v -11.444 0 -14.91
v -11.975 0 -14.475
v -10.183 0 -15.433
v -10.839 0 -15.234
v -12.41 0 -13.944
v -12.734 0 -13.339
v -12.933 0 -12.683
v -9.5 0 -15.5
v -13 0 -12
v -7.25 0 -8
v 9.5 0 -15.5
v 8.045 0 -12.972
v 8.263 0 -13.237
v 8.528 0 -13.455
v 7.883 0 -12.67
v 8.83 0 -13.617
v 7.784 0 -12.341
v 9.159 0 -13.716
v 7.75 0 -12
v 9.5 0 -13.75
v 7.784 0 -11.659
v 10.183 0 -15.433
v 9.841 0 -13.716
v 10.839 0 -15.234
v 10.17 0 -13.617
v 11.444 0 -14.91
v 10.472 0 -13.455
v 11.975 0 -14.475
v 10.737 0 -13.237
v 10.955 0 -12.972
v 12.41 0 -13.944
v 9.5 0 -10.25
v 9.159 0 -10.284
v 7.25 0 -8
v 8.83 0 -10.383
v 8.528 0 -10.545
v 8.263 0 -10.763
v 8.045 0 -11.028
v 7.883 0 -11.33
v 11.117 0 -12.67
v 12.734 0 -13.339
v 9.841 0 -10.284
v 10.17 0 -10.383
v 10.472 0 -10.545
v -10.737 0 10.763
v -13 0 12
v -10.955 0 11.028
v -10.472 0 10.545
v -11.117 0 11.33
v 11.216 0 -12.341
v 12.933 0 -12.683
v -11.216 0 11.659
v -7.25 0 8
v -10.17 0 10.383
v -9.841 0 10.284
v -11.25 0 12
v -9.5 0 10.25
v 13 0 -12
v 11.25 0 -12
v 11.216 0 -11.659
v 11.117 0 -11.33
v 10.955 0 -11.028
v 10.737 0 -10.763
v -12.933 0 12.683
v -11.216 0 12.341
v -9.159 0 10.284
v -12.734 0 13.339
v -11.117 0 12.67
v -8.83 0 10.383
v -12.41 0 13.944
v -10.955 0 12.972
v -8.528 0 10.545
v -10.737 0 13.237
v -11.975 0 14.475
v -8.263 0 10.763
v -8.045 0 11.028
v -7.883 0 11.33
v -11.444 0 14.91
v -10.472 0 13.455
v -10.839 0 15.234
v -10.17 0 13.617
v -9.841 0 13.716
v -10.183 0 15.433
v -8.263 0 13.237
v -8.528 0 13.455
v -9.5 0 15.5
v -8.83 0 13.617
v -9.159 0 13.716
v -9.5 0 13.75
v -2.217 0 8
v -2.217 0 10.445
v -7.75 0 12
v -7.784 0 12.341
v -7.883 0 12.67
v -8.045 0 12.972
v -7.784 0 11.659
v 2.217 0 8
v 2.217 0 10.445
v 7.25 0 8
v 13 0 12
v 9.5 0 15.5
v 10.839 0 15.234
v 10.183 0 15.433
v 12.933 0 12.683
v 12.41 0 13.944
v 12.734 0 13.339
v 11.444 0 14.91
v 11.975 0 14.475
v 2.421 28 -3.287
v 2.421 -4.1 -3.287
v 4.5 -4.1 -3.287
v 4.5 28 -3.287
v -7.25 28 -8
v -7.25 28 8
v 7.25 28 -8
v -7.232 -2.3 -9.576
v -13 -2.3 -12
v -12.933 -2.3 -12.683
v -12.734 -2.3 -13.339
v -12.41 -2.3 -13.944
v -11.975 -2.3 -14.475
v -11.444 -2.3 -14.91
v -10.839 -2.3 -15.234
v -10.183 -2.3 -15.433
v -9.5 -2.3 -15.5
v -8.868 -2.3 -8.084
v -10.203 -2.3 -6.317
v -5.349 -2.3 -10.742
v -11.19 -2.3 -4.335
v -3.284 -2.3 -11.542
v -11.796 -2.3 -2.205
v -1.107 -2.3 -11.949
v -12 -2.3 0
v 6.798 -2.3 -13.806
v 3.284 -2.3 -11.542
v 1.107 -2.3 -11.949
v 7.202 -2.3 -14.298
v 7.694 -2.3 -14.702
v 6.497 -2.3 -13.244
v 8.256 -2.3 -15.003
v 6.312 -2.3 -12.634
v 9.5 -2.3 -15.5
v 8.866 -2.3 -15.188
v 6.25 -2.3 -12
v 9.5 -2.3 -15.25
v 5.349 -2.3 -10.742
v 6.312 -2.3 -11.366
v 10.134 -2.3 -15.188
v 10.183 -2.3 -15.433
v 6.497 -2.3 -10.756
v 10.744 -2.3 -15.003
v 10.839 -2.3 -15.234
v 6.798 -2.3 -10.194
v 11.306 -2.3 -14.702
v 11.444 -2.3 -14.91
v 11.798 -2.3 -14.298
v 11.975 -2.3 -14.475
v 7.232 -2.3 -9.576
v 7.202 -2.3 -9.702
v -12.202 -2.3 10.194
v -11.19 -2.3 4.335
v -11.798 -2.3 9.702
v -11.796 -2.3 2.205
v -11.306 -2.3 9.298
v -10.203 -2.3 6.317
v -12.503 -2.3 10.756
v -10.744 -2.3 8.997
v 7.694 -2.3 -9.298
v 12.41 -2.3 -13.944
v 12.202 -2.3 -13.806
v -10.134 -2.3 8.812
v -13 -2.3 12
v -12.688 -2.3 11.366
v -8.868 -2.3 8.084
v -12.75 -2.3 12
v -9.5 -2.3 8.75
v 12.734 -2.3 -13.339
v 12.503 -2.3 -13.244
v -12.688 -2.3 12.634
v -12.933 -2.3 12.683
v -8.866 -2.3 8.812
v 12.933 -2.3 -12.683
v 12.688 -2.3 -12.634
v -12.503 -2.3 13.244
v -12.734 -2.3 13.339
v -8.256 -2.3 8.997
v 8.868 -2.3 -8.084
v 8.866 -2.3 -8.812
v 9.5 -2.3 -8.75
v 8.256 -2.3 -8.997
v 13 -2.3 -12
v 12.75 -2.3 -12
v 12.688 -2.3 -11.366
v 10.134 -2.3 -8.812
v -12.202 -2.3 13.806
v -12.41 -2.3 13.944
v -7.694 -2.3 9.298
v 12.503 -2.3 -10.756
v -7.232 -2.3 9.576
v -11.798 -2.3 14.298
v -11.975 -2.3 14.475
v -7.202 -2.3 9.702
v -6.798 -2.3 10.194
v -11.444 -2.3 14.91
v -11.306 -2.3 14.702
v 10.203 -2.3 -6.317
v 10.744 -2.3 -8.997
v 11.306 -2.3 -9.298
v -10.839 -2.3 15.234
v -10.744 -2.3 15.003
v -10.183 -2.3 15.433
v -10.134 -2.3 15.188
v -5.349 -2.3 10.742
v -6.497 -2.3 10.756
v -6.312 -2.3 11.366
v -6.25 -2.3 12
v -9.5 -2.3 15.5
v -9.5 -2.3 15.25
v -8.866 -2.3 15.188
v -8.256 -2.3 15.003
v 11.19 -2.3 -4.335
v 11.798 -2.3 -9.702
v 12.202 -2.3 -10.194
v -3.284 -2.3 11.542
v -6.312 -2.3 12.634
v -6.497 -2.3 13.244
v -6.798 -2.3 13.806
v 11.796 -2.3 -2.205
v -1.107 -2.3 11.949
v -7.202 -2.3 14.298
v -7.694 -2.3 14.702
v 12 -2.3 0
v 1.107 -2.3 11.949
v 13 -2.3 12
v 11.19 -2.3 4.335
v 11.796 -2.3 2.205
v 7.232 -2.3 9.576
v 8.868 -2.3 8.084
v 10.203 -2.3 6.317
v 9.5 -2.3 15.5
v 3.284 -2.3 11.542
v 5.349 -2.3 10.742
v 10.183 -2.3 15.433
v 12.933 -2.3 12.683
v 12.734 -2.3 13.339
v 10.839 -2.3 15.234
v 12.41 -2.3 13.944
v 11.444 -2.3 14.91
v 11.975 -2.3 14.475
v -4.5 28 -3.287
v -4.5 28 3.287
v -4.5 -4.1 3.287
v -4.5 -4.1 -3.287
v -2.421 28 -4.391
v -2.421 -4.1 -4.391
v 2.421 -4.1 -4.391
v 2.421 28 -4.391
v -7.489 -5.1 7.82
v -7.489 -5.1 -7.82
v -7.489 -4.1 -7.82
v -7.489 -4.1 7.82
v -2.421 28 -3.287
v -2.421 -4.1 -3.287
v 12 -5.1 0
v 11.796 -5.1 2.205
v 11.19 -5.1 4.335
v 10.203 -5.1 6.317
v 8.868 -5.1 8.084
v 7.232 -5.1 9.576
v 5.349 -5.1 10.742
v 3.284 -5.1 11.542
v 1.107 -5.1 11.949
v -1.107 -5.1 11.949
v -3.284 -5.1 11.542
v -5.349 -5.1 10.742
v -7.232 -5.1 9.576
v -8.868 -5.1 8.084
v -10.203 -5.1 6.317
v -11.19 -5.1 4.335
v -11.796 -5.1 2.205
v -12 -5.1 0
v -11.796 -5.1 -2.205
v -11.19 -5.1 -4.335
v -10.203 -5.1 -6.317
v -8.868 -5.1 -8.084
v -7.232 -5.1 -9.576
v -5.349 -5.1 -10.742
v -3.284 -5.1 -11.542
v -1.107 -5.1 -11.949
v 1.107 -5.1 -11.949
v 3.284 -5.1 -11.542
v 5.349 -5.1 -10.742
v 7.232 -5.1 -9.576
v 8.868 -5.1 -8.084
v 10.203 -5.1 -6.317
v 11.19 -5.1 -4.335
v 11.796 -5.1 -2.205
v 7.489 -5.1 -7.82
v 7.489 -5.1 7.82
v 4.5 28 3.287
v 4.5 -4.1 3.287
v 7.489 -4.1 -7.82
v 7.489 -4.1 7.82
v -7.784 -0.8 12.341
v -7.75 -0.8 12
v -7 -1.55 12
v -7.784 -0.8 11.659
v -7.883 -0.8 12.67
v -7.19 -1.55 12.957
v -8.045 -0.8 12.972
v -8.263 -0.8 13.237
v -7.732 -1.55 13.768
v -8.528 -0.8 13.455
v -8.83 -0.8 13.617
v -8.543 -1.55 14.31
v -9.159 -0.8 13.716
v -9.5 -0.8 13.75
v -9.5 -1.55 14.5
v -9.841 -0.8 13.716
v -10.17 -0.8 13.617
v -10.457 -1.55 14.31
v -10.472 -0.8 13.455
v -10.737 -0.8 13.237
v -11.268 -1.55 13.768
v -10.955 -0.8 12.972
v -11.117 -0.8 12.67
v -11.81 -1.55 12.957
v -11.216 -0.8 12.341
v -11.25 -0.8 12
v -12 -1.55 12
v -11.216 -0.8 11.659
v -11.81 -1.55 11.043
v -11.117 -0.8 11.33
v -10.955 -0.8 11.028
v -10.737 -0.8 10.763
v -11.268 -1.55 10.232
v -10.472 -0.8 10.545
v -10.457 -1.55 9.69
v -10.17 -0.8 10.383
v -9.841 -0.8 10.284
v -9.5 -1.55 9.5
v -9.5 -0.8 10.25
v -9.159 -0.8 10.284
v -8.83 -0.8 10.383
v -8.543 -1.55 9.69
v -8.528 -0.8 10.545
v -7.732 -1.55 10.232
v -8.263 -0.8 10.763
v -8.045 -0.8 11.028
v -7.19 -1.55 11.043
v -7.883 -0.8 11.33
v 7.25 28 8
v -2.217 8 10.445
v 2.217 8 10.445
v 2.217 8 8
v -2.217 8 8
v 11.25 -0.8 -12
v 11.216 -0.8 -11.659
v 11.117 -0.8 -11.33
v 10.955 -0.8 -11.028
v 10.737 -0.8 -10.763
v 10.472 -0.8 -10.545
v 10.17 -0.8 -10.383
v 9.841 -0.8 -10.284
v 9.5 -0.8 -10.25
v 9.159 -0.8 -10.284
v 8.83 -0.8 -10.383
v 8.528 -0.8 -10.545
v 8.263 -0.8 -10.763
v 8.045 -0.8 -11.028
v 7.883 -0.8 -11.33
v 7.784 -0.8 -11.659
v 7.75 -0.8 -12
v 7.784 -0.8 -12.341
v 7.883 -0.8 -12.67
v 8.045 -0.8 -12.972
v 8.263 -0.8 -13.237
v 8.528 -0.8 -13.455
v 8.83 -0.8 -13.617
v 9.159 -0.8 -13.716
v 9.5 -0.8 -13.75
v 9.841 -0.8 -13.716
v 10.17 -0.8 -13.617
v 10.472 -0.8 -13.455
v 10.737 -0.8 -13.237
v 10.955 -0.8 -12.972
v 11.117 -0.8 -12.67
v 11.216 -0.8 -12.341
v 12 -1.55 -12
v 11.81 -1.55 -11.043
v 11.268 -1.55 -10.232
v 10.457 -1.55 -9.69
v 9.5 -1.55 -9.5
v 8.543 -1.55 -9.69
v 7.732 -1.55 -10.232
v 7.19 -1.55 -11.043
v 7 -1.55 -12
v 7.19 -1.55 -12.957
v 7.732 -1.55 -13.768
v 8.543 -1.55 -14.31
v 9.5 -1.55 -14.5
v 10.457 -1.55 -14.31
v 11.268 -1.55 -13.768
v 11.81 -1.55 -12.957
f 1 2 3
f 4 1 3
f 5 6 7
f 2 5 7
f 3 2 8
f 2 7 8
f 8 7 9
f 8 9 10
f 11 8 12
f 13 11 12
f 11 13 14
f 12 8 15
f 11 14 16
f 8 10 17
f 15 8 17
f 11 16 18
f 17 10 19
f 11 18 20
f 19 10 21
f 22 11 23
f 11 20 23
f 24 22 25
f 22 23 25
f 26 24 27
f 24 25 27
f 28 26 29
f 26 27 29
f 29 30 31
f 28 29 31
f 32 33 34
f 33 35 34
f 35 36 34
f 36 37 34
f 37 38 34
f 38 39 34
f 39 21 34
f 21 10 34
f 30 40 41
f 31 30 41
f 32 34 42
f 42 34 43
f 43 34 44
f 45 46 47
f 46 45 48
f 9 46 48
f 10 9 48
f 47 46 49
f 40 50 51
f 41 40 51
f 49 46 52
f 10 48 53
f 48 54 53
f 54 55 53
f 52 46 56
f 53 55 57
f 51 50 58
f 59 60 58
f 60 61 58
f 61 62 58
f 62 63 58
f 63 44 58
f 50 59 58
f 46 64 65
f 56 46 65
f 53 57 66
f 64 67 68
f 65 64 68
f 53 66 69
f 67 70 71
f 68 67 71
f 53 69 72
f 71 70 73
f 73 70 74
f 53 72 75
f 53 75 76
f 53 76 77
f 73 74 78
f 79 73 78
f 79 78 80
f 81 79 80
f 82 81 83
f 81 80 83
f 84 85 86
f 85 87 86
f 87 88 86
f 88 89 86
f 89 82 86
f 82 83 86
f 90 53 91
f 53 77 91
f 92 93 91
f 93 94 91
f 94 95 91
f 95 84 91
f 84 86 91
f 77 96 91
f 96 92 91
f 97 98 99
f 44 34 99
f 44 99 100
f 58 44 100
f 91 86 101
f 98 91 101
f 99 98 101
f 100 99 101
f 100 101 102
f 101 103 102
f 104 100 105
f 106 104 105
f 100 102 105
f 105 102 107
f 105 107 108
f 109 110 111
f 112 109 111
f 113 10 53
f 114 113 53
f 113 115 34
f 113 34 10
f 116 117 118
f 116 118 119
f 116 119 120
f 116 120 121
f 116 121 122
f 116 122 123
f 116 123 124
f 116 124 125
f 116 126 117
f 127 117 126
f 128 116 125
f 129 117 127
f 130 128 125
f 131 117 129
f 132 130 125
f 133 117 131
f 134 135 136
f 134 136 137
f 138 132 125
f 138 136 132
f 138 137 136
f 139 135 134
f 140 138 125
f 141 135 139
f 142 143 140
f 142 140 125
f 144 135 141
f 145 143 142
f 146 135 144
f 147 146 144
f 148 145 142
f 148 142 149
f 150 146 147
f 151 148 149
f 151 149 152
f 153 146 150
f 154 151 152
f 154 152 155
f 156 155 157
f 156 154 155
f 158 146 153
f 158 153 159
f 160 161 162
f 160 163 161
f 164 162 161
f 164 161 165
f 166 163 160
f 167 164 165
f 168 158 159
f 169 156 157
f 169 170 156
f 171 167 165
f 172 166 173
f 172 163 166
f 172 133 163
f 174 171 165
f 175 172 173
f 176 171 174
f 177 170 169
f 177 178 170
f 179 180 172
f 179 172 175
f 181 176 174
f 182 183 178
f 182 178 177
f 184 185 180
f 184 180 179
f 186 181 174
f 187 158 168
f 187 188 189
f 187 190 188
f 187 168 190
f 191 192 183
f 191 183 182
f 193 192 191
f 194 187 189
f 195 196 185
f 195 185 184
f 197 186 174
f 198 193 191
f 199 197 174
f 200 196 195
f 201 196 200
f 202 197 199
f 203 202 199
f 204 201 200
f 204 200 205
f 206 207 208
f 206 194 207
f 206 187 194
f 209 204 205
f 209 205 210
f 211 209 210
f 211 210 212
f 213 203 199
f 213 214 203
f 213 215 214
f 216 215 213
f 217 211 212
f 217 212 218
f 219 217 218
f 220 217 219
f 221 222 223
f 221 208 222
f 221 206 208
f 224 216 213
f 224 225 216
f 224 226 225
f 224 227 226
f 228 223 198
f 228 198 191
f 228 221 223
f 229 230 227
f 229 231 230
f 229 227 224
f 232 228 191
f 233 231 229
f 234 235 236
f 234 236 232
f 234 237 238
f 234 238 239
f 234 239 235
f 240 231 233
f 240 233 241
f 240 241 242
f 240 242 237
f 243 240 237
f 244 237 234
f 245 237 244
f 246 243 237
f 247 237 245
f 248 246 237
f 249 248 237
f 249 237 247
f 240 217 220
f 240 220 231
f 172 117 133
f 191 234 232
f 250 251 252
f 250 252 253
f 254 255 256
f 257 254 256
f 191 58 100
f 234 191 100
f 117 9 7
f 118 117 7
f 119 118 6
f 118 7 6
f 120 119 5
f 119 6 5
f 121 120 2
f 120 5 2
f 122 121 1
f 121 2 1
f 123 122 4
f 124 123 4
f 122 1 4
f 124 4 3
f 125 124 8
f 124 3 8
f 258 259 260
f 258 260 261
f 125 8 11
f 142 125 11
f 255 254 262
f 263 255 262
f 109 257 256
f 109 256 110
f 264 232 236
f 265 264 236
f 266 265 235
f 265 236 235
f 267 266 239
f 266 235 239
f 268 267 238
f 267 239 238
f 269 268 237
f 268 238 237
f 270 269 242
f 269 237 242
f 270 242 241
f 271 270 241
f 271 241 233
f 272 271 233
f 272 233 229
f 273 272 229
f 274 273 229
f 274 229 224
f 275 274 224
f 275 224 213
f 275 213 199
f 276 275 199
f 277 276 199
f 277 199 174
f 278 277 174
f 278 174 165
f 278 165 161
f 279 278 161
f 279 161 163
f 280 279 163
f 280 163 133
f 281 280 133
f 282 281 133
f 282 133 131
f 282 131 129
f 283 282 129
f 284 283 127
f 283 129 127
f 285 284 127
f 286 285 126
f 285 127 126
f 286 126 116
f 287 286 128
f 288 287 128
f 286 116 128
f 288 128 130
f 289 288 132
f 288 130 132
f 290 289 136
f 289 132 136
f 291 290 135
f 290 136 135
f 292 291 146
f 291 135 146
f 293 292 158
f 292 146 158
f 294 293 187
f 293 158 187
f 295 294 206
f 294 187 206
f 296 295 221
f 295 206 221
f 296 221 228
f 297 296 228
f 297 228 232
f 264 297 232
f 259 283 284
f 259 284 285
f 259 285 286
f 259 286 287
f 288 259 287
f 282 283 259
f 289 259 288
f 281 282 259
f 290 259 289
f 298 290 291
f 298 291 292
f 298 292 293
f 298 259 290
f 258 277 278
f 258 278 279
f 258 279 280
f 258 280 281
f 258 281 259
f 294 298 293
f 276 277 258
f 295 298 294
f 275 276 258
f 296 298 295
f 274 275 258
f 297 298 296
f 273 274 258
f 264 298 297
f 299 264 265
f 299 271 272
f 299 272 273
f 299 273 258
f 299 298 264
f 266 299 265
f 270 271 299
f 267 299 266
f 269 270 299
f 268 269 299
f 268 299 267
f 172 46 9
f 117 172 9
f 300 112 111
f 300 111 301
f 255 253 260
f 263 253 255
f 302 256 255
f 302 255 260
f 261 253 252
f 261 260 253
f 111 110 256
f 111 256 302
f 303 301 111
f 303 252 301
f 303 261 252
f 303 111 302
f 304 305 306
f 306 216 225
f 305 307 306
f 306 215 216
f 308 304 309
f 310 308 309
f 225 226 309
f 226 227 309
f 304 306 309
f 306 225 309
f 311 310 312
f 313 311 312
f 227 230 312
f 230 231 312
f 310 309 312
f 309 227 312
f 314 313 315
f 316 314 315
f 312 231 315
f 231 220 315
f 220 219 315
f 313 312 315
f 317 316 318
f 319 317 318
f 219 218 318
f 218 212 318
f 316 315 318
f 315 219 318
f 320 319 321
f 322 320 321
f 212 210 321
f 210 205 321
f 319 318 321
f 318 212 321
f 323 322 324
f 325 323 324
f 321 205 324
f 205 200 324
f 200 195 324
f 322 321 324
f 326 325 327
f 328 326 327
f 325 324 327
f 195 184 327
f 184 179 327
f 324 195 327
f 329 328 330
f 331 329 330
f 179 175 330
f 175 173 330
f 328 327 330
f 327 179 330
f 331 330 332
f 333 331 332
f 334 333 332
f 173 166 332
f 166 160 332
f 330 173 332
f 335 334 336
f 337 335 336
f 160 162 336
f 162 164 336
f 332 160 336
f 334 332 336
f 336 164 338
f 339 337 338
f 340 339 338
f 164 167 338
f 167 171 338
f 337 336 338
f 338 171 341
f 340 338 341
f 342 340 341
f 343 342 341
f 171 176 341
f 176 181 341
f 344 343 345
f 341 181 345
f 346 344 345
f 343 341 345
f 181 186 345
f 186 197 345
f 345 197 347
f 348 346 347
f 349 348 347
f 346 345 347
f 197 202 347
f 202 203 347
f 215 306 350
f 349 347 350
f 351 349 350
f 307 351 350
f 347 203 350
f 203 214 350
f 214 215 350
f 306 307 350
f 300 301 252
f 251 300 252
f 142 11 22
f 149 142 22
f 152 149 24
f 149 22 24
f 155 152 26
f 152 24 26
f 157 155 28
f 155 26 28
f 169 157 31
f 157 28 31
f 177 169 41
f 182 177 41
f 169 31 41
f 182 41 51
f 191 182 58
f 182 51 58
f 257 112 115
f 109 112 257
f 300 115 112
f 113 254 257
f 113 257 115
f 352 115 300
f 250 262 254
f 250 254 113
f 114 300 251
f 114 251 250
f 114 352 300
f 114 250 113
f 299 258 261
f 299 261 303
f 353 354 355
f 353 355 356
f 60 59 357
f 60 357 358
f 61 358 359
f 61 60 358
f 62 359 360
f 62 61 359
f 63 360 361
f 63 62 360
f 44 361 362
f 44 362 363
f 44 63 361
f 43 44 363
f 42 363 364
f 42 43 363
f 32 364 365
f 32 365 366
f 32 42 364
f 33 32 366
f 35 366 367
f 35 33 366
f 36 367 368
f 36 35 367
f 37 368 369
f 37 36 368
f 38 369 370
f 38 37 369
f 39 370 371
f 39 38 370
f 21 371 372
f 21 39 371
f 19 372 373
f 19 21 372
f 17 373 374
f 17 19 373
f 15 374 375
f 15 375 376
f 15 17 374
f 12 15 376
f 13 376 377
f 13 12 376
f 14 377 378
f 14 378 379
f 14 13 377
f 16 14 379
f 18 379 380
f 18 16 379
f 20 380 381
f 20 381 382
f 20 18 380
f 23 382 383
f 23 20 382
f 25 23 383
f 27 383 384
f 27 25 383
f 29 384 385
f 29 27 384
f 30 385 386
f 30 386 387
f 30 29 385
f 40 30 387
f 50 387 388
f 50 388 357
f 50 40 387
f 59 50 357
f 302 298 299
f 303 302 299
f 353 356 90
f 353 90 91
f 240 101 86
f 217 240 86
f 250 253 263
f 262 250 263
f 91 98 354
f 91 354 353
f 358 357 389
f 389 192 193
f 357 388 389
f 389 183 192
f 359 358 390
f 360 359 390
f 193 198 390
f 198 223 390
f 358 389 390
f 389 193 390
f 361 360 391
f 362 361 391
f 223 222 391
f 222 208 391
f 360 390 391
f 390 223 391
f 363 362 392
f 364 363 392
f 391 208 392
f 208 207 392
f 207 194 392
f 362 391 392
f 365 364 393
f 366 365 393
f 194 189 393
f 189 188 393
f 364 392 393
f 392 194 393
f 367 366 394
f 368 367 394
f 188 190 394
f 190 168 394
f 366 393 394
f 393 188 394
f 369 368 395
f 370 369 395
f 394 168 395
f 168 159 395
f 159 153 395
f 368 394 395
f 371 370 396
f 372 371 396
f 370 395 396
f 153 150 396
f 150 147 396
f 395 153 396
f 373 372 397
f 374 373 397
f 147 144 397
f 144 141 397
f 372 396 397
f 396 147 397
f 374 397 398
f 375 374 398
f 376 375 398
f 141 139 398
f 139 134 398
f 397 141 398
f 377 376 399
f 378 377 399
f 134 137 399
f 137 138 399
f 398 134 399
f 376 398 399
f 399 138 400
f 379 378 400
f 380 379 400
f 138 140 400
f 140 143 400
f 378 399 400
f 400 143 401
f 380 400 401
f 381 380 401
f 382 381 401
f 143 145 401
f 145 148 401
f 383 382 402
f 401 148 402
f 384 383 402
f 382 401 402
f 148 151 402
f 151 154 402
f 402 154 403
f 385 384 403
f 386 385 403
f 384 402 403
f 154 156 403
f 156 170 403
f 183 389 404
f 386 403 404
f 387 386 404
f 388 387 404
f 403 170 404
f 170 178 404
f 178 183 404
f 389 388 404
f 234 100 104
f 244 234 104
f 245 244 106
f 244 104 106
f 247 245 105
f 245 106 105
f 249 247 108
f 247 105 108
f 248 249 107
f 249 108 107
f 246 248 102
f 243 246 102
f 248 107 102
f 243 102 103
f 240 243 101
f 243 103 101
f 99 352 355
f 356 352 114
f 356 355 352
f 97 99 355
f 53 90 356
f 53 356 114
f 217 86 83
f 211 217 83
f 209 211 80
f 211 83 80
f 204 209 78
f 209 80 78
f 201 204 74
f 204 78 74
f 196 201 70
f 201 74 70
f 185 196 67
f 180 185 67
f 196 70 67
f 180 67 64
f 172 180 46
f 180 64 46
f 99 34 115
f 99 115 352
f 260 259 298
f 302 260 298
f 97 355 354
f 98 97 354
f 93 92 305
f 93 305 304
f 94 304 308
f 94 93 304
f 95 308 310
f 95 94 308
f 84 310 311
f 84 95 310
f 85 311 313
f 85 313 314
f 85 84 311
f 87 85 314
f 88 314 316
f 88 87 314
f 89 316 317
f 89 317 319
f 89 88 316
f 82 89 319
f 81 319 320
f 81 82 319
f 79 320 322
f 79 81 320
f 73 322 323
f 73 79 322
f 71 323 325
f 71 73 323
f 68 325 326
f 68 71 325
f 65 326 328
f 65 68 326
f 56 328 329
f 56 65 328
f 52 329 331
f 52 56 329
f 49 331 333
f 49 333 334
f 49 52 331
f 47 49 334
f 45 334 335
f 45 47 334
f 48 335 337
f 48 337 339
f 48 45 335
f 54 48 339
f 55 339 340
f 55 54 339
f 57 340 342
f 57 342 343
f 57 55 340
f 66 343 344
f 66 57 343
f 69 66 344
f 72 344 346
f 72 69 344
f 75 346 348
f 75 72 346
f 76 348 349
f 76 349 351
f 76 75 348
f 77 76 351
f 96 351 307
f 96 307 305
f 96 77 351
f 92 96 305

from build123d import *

# Parameters (mm, degrees)
F0_R      = 1.75
F0_R_2    = 12
F1_DEPTH  = 2.3
F2_DEPTH  = 5.1
F3_W      = 14.9775519967
F3_H      = 15.6408976763
F3_W_2    = 4.8427809961
F3_H_2    = 1.104
F4_DEPTH  = 1
F5_DEPTH  = 3
F6_SIZE   = 1.5
F7_W      = 14.5
F7_H      = 16
F8_DEPTH  = 28
F9_W      = 4.4338763691
F9_H      = 4.8907462656
F10_DEPTH = 8
F11_DEPTH = 30.1


with BuildPart() as f1:
    # F0 (on Front) → F1 (new body)
    with BuildSketch(Plane.XZ):
        with BuildLine():
            ThreePointArc((13, 12), (11.9748737342, 14.4748737342), (9.5, 15.5))
            Line((9.5, 15.5), (-9.5, 15.5))
            ThreePointArc((-9.5, 15.5), (-11.9748737342, 14.4748737342), (-13, 12))
            Line((-13, 12), (-13, -12))
            ThreePointArc((-13, -12), (-11.9748737342, -14.4748737342), (-9.5, -15.5))
            Line((-9.5, -15.5), (9.5, -15.5))
            ThreePointArc((9.5, -15.5), (11.9748737342, -14.4748737342), (13, -12))
            Line((13, -12), (13, 12))
        make_face()
        with Locations((9.5, -12)):
            Circle(F0_R, mode=Mode.SUBTRACT)
        with Locations((-9.5, 12)):
            Circle(F0_R, mode=Mode.SUBTRACT)
        Circle(F0_R_2, mode=Mode.SUBTRACT)
        Circle(F0_R_2)
    extrude(amount=F1_DEPTH)

    # F0 (on Front) → F2 (join)
    with BuildSketch(Plane.XZ):
        Circle(F0_R_2)
    extrude(amount=F2_DEPTH)

    # F3 (on face) → F4 (cut)
    with BuildSketch(Plane.XZ.offset(5.1)):
        Rectangle(F3_W, F3_H)
        Polygon((-4.5, 3.2868520357), (4.5, 3.2868520357), (4.5, -3.2868520357), (2.4213904981, -3.2868520357), (2.4213904981, -4.3908520357), (-2.4213904981, -4.3908520357), (-2.4213904981, -3.2868520357), (-4.5, -3.2868520357), align=None, mode=Mode.SUBTRACT)
        Polygon((4.5, -3.2868520357), (4.5, 3.2868520357), (-4.5, 3.2868520357), (-4.5, -3.2868520357), (-2.4213904981, -3.2868520357), (-2.4213904981, -2.1828520357), (2.4213904981, -2.1828520357), (2.4213904981, -3.2868520357), align=None)
        with Locations((0, -2.7348520357)):
            Rectangle(F3_W_2, F3_H_2)
        with Locations((0, -3.8388520357)):
            Rectangle(F3_W_2, F3_H_2)
    extrude(amount=-F4_DEPTH, mode=Mode.SUBTRACT)

    # F3 (on face) → F5 (cut)
    with BuildSketch(Plane.XZ.offset(5.1)):
        Polygon((4.5, -3.2868520357), (4.5, 3.2868520357), (-4.5, 3.2868520357), (-4.5, -3.2868520357), (-2.4213904981, -3.2868520357), (-2.4213904981, -2.1828520357), (2.4213904981, -2.1828520357), (2.4213904981, -3.2868520357), align=None)
        with Locations((0, -2.7348520357)):
            Rectangle(F3_W_2, F3_H_2)
        with Locations((0, -3.8388520357)):
            Rectangle(F3_W_2, F3_H_2)
    extrude(amount=-F5_DEPTH, mode=Mode.SUBTRACT)

    # F6
    f6_edges = [f1.edges().sort_by_distance(p)[0] for p in [
        (-11.25, -2.3, 12),
        (7.75, -2.3, -12),
    ]]
    chamfer(f6_edges, length=F6_SIZE)

    # F7 (on face) → F8 (join)
    with BuildSketch(Plane(origin=(0, 0, 0), x_dir=(-1, 0, 0), z_dir=(0, 1, 0))):
        Rectangle(F7_W, F7_H)
    extrude(amount=F8_DEPTH)

    # F9 (on face) → F10 (join)
    with BuildSketch(Plane(origin=(0, 0, 0), x_dir=(-1, 0, 0), z_dir=(0, 1, 0))):
        with Locations((0, 8)):
            Rectangle(F9_W, F9_H)
    extrude(amount=F10_DEPTH)

    # F11 (cut, through all): a face of the model
    f11_faces = [f1.faces().sort_by_distance(p)[0] for p in [
        (0, -2.1, -0.3181557698),
    ]]
    extrude(f11_faces, amount=-F11_DEPTH, mode=Mode.SUBTRACT)


solid = f1.part
